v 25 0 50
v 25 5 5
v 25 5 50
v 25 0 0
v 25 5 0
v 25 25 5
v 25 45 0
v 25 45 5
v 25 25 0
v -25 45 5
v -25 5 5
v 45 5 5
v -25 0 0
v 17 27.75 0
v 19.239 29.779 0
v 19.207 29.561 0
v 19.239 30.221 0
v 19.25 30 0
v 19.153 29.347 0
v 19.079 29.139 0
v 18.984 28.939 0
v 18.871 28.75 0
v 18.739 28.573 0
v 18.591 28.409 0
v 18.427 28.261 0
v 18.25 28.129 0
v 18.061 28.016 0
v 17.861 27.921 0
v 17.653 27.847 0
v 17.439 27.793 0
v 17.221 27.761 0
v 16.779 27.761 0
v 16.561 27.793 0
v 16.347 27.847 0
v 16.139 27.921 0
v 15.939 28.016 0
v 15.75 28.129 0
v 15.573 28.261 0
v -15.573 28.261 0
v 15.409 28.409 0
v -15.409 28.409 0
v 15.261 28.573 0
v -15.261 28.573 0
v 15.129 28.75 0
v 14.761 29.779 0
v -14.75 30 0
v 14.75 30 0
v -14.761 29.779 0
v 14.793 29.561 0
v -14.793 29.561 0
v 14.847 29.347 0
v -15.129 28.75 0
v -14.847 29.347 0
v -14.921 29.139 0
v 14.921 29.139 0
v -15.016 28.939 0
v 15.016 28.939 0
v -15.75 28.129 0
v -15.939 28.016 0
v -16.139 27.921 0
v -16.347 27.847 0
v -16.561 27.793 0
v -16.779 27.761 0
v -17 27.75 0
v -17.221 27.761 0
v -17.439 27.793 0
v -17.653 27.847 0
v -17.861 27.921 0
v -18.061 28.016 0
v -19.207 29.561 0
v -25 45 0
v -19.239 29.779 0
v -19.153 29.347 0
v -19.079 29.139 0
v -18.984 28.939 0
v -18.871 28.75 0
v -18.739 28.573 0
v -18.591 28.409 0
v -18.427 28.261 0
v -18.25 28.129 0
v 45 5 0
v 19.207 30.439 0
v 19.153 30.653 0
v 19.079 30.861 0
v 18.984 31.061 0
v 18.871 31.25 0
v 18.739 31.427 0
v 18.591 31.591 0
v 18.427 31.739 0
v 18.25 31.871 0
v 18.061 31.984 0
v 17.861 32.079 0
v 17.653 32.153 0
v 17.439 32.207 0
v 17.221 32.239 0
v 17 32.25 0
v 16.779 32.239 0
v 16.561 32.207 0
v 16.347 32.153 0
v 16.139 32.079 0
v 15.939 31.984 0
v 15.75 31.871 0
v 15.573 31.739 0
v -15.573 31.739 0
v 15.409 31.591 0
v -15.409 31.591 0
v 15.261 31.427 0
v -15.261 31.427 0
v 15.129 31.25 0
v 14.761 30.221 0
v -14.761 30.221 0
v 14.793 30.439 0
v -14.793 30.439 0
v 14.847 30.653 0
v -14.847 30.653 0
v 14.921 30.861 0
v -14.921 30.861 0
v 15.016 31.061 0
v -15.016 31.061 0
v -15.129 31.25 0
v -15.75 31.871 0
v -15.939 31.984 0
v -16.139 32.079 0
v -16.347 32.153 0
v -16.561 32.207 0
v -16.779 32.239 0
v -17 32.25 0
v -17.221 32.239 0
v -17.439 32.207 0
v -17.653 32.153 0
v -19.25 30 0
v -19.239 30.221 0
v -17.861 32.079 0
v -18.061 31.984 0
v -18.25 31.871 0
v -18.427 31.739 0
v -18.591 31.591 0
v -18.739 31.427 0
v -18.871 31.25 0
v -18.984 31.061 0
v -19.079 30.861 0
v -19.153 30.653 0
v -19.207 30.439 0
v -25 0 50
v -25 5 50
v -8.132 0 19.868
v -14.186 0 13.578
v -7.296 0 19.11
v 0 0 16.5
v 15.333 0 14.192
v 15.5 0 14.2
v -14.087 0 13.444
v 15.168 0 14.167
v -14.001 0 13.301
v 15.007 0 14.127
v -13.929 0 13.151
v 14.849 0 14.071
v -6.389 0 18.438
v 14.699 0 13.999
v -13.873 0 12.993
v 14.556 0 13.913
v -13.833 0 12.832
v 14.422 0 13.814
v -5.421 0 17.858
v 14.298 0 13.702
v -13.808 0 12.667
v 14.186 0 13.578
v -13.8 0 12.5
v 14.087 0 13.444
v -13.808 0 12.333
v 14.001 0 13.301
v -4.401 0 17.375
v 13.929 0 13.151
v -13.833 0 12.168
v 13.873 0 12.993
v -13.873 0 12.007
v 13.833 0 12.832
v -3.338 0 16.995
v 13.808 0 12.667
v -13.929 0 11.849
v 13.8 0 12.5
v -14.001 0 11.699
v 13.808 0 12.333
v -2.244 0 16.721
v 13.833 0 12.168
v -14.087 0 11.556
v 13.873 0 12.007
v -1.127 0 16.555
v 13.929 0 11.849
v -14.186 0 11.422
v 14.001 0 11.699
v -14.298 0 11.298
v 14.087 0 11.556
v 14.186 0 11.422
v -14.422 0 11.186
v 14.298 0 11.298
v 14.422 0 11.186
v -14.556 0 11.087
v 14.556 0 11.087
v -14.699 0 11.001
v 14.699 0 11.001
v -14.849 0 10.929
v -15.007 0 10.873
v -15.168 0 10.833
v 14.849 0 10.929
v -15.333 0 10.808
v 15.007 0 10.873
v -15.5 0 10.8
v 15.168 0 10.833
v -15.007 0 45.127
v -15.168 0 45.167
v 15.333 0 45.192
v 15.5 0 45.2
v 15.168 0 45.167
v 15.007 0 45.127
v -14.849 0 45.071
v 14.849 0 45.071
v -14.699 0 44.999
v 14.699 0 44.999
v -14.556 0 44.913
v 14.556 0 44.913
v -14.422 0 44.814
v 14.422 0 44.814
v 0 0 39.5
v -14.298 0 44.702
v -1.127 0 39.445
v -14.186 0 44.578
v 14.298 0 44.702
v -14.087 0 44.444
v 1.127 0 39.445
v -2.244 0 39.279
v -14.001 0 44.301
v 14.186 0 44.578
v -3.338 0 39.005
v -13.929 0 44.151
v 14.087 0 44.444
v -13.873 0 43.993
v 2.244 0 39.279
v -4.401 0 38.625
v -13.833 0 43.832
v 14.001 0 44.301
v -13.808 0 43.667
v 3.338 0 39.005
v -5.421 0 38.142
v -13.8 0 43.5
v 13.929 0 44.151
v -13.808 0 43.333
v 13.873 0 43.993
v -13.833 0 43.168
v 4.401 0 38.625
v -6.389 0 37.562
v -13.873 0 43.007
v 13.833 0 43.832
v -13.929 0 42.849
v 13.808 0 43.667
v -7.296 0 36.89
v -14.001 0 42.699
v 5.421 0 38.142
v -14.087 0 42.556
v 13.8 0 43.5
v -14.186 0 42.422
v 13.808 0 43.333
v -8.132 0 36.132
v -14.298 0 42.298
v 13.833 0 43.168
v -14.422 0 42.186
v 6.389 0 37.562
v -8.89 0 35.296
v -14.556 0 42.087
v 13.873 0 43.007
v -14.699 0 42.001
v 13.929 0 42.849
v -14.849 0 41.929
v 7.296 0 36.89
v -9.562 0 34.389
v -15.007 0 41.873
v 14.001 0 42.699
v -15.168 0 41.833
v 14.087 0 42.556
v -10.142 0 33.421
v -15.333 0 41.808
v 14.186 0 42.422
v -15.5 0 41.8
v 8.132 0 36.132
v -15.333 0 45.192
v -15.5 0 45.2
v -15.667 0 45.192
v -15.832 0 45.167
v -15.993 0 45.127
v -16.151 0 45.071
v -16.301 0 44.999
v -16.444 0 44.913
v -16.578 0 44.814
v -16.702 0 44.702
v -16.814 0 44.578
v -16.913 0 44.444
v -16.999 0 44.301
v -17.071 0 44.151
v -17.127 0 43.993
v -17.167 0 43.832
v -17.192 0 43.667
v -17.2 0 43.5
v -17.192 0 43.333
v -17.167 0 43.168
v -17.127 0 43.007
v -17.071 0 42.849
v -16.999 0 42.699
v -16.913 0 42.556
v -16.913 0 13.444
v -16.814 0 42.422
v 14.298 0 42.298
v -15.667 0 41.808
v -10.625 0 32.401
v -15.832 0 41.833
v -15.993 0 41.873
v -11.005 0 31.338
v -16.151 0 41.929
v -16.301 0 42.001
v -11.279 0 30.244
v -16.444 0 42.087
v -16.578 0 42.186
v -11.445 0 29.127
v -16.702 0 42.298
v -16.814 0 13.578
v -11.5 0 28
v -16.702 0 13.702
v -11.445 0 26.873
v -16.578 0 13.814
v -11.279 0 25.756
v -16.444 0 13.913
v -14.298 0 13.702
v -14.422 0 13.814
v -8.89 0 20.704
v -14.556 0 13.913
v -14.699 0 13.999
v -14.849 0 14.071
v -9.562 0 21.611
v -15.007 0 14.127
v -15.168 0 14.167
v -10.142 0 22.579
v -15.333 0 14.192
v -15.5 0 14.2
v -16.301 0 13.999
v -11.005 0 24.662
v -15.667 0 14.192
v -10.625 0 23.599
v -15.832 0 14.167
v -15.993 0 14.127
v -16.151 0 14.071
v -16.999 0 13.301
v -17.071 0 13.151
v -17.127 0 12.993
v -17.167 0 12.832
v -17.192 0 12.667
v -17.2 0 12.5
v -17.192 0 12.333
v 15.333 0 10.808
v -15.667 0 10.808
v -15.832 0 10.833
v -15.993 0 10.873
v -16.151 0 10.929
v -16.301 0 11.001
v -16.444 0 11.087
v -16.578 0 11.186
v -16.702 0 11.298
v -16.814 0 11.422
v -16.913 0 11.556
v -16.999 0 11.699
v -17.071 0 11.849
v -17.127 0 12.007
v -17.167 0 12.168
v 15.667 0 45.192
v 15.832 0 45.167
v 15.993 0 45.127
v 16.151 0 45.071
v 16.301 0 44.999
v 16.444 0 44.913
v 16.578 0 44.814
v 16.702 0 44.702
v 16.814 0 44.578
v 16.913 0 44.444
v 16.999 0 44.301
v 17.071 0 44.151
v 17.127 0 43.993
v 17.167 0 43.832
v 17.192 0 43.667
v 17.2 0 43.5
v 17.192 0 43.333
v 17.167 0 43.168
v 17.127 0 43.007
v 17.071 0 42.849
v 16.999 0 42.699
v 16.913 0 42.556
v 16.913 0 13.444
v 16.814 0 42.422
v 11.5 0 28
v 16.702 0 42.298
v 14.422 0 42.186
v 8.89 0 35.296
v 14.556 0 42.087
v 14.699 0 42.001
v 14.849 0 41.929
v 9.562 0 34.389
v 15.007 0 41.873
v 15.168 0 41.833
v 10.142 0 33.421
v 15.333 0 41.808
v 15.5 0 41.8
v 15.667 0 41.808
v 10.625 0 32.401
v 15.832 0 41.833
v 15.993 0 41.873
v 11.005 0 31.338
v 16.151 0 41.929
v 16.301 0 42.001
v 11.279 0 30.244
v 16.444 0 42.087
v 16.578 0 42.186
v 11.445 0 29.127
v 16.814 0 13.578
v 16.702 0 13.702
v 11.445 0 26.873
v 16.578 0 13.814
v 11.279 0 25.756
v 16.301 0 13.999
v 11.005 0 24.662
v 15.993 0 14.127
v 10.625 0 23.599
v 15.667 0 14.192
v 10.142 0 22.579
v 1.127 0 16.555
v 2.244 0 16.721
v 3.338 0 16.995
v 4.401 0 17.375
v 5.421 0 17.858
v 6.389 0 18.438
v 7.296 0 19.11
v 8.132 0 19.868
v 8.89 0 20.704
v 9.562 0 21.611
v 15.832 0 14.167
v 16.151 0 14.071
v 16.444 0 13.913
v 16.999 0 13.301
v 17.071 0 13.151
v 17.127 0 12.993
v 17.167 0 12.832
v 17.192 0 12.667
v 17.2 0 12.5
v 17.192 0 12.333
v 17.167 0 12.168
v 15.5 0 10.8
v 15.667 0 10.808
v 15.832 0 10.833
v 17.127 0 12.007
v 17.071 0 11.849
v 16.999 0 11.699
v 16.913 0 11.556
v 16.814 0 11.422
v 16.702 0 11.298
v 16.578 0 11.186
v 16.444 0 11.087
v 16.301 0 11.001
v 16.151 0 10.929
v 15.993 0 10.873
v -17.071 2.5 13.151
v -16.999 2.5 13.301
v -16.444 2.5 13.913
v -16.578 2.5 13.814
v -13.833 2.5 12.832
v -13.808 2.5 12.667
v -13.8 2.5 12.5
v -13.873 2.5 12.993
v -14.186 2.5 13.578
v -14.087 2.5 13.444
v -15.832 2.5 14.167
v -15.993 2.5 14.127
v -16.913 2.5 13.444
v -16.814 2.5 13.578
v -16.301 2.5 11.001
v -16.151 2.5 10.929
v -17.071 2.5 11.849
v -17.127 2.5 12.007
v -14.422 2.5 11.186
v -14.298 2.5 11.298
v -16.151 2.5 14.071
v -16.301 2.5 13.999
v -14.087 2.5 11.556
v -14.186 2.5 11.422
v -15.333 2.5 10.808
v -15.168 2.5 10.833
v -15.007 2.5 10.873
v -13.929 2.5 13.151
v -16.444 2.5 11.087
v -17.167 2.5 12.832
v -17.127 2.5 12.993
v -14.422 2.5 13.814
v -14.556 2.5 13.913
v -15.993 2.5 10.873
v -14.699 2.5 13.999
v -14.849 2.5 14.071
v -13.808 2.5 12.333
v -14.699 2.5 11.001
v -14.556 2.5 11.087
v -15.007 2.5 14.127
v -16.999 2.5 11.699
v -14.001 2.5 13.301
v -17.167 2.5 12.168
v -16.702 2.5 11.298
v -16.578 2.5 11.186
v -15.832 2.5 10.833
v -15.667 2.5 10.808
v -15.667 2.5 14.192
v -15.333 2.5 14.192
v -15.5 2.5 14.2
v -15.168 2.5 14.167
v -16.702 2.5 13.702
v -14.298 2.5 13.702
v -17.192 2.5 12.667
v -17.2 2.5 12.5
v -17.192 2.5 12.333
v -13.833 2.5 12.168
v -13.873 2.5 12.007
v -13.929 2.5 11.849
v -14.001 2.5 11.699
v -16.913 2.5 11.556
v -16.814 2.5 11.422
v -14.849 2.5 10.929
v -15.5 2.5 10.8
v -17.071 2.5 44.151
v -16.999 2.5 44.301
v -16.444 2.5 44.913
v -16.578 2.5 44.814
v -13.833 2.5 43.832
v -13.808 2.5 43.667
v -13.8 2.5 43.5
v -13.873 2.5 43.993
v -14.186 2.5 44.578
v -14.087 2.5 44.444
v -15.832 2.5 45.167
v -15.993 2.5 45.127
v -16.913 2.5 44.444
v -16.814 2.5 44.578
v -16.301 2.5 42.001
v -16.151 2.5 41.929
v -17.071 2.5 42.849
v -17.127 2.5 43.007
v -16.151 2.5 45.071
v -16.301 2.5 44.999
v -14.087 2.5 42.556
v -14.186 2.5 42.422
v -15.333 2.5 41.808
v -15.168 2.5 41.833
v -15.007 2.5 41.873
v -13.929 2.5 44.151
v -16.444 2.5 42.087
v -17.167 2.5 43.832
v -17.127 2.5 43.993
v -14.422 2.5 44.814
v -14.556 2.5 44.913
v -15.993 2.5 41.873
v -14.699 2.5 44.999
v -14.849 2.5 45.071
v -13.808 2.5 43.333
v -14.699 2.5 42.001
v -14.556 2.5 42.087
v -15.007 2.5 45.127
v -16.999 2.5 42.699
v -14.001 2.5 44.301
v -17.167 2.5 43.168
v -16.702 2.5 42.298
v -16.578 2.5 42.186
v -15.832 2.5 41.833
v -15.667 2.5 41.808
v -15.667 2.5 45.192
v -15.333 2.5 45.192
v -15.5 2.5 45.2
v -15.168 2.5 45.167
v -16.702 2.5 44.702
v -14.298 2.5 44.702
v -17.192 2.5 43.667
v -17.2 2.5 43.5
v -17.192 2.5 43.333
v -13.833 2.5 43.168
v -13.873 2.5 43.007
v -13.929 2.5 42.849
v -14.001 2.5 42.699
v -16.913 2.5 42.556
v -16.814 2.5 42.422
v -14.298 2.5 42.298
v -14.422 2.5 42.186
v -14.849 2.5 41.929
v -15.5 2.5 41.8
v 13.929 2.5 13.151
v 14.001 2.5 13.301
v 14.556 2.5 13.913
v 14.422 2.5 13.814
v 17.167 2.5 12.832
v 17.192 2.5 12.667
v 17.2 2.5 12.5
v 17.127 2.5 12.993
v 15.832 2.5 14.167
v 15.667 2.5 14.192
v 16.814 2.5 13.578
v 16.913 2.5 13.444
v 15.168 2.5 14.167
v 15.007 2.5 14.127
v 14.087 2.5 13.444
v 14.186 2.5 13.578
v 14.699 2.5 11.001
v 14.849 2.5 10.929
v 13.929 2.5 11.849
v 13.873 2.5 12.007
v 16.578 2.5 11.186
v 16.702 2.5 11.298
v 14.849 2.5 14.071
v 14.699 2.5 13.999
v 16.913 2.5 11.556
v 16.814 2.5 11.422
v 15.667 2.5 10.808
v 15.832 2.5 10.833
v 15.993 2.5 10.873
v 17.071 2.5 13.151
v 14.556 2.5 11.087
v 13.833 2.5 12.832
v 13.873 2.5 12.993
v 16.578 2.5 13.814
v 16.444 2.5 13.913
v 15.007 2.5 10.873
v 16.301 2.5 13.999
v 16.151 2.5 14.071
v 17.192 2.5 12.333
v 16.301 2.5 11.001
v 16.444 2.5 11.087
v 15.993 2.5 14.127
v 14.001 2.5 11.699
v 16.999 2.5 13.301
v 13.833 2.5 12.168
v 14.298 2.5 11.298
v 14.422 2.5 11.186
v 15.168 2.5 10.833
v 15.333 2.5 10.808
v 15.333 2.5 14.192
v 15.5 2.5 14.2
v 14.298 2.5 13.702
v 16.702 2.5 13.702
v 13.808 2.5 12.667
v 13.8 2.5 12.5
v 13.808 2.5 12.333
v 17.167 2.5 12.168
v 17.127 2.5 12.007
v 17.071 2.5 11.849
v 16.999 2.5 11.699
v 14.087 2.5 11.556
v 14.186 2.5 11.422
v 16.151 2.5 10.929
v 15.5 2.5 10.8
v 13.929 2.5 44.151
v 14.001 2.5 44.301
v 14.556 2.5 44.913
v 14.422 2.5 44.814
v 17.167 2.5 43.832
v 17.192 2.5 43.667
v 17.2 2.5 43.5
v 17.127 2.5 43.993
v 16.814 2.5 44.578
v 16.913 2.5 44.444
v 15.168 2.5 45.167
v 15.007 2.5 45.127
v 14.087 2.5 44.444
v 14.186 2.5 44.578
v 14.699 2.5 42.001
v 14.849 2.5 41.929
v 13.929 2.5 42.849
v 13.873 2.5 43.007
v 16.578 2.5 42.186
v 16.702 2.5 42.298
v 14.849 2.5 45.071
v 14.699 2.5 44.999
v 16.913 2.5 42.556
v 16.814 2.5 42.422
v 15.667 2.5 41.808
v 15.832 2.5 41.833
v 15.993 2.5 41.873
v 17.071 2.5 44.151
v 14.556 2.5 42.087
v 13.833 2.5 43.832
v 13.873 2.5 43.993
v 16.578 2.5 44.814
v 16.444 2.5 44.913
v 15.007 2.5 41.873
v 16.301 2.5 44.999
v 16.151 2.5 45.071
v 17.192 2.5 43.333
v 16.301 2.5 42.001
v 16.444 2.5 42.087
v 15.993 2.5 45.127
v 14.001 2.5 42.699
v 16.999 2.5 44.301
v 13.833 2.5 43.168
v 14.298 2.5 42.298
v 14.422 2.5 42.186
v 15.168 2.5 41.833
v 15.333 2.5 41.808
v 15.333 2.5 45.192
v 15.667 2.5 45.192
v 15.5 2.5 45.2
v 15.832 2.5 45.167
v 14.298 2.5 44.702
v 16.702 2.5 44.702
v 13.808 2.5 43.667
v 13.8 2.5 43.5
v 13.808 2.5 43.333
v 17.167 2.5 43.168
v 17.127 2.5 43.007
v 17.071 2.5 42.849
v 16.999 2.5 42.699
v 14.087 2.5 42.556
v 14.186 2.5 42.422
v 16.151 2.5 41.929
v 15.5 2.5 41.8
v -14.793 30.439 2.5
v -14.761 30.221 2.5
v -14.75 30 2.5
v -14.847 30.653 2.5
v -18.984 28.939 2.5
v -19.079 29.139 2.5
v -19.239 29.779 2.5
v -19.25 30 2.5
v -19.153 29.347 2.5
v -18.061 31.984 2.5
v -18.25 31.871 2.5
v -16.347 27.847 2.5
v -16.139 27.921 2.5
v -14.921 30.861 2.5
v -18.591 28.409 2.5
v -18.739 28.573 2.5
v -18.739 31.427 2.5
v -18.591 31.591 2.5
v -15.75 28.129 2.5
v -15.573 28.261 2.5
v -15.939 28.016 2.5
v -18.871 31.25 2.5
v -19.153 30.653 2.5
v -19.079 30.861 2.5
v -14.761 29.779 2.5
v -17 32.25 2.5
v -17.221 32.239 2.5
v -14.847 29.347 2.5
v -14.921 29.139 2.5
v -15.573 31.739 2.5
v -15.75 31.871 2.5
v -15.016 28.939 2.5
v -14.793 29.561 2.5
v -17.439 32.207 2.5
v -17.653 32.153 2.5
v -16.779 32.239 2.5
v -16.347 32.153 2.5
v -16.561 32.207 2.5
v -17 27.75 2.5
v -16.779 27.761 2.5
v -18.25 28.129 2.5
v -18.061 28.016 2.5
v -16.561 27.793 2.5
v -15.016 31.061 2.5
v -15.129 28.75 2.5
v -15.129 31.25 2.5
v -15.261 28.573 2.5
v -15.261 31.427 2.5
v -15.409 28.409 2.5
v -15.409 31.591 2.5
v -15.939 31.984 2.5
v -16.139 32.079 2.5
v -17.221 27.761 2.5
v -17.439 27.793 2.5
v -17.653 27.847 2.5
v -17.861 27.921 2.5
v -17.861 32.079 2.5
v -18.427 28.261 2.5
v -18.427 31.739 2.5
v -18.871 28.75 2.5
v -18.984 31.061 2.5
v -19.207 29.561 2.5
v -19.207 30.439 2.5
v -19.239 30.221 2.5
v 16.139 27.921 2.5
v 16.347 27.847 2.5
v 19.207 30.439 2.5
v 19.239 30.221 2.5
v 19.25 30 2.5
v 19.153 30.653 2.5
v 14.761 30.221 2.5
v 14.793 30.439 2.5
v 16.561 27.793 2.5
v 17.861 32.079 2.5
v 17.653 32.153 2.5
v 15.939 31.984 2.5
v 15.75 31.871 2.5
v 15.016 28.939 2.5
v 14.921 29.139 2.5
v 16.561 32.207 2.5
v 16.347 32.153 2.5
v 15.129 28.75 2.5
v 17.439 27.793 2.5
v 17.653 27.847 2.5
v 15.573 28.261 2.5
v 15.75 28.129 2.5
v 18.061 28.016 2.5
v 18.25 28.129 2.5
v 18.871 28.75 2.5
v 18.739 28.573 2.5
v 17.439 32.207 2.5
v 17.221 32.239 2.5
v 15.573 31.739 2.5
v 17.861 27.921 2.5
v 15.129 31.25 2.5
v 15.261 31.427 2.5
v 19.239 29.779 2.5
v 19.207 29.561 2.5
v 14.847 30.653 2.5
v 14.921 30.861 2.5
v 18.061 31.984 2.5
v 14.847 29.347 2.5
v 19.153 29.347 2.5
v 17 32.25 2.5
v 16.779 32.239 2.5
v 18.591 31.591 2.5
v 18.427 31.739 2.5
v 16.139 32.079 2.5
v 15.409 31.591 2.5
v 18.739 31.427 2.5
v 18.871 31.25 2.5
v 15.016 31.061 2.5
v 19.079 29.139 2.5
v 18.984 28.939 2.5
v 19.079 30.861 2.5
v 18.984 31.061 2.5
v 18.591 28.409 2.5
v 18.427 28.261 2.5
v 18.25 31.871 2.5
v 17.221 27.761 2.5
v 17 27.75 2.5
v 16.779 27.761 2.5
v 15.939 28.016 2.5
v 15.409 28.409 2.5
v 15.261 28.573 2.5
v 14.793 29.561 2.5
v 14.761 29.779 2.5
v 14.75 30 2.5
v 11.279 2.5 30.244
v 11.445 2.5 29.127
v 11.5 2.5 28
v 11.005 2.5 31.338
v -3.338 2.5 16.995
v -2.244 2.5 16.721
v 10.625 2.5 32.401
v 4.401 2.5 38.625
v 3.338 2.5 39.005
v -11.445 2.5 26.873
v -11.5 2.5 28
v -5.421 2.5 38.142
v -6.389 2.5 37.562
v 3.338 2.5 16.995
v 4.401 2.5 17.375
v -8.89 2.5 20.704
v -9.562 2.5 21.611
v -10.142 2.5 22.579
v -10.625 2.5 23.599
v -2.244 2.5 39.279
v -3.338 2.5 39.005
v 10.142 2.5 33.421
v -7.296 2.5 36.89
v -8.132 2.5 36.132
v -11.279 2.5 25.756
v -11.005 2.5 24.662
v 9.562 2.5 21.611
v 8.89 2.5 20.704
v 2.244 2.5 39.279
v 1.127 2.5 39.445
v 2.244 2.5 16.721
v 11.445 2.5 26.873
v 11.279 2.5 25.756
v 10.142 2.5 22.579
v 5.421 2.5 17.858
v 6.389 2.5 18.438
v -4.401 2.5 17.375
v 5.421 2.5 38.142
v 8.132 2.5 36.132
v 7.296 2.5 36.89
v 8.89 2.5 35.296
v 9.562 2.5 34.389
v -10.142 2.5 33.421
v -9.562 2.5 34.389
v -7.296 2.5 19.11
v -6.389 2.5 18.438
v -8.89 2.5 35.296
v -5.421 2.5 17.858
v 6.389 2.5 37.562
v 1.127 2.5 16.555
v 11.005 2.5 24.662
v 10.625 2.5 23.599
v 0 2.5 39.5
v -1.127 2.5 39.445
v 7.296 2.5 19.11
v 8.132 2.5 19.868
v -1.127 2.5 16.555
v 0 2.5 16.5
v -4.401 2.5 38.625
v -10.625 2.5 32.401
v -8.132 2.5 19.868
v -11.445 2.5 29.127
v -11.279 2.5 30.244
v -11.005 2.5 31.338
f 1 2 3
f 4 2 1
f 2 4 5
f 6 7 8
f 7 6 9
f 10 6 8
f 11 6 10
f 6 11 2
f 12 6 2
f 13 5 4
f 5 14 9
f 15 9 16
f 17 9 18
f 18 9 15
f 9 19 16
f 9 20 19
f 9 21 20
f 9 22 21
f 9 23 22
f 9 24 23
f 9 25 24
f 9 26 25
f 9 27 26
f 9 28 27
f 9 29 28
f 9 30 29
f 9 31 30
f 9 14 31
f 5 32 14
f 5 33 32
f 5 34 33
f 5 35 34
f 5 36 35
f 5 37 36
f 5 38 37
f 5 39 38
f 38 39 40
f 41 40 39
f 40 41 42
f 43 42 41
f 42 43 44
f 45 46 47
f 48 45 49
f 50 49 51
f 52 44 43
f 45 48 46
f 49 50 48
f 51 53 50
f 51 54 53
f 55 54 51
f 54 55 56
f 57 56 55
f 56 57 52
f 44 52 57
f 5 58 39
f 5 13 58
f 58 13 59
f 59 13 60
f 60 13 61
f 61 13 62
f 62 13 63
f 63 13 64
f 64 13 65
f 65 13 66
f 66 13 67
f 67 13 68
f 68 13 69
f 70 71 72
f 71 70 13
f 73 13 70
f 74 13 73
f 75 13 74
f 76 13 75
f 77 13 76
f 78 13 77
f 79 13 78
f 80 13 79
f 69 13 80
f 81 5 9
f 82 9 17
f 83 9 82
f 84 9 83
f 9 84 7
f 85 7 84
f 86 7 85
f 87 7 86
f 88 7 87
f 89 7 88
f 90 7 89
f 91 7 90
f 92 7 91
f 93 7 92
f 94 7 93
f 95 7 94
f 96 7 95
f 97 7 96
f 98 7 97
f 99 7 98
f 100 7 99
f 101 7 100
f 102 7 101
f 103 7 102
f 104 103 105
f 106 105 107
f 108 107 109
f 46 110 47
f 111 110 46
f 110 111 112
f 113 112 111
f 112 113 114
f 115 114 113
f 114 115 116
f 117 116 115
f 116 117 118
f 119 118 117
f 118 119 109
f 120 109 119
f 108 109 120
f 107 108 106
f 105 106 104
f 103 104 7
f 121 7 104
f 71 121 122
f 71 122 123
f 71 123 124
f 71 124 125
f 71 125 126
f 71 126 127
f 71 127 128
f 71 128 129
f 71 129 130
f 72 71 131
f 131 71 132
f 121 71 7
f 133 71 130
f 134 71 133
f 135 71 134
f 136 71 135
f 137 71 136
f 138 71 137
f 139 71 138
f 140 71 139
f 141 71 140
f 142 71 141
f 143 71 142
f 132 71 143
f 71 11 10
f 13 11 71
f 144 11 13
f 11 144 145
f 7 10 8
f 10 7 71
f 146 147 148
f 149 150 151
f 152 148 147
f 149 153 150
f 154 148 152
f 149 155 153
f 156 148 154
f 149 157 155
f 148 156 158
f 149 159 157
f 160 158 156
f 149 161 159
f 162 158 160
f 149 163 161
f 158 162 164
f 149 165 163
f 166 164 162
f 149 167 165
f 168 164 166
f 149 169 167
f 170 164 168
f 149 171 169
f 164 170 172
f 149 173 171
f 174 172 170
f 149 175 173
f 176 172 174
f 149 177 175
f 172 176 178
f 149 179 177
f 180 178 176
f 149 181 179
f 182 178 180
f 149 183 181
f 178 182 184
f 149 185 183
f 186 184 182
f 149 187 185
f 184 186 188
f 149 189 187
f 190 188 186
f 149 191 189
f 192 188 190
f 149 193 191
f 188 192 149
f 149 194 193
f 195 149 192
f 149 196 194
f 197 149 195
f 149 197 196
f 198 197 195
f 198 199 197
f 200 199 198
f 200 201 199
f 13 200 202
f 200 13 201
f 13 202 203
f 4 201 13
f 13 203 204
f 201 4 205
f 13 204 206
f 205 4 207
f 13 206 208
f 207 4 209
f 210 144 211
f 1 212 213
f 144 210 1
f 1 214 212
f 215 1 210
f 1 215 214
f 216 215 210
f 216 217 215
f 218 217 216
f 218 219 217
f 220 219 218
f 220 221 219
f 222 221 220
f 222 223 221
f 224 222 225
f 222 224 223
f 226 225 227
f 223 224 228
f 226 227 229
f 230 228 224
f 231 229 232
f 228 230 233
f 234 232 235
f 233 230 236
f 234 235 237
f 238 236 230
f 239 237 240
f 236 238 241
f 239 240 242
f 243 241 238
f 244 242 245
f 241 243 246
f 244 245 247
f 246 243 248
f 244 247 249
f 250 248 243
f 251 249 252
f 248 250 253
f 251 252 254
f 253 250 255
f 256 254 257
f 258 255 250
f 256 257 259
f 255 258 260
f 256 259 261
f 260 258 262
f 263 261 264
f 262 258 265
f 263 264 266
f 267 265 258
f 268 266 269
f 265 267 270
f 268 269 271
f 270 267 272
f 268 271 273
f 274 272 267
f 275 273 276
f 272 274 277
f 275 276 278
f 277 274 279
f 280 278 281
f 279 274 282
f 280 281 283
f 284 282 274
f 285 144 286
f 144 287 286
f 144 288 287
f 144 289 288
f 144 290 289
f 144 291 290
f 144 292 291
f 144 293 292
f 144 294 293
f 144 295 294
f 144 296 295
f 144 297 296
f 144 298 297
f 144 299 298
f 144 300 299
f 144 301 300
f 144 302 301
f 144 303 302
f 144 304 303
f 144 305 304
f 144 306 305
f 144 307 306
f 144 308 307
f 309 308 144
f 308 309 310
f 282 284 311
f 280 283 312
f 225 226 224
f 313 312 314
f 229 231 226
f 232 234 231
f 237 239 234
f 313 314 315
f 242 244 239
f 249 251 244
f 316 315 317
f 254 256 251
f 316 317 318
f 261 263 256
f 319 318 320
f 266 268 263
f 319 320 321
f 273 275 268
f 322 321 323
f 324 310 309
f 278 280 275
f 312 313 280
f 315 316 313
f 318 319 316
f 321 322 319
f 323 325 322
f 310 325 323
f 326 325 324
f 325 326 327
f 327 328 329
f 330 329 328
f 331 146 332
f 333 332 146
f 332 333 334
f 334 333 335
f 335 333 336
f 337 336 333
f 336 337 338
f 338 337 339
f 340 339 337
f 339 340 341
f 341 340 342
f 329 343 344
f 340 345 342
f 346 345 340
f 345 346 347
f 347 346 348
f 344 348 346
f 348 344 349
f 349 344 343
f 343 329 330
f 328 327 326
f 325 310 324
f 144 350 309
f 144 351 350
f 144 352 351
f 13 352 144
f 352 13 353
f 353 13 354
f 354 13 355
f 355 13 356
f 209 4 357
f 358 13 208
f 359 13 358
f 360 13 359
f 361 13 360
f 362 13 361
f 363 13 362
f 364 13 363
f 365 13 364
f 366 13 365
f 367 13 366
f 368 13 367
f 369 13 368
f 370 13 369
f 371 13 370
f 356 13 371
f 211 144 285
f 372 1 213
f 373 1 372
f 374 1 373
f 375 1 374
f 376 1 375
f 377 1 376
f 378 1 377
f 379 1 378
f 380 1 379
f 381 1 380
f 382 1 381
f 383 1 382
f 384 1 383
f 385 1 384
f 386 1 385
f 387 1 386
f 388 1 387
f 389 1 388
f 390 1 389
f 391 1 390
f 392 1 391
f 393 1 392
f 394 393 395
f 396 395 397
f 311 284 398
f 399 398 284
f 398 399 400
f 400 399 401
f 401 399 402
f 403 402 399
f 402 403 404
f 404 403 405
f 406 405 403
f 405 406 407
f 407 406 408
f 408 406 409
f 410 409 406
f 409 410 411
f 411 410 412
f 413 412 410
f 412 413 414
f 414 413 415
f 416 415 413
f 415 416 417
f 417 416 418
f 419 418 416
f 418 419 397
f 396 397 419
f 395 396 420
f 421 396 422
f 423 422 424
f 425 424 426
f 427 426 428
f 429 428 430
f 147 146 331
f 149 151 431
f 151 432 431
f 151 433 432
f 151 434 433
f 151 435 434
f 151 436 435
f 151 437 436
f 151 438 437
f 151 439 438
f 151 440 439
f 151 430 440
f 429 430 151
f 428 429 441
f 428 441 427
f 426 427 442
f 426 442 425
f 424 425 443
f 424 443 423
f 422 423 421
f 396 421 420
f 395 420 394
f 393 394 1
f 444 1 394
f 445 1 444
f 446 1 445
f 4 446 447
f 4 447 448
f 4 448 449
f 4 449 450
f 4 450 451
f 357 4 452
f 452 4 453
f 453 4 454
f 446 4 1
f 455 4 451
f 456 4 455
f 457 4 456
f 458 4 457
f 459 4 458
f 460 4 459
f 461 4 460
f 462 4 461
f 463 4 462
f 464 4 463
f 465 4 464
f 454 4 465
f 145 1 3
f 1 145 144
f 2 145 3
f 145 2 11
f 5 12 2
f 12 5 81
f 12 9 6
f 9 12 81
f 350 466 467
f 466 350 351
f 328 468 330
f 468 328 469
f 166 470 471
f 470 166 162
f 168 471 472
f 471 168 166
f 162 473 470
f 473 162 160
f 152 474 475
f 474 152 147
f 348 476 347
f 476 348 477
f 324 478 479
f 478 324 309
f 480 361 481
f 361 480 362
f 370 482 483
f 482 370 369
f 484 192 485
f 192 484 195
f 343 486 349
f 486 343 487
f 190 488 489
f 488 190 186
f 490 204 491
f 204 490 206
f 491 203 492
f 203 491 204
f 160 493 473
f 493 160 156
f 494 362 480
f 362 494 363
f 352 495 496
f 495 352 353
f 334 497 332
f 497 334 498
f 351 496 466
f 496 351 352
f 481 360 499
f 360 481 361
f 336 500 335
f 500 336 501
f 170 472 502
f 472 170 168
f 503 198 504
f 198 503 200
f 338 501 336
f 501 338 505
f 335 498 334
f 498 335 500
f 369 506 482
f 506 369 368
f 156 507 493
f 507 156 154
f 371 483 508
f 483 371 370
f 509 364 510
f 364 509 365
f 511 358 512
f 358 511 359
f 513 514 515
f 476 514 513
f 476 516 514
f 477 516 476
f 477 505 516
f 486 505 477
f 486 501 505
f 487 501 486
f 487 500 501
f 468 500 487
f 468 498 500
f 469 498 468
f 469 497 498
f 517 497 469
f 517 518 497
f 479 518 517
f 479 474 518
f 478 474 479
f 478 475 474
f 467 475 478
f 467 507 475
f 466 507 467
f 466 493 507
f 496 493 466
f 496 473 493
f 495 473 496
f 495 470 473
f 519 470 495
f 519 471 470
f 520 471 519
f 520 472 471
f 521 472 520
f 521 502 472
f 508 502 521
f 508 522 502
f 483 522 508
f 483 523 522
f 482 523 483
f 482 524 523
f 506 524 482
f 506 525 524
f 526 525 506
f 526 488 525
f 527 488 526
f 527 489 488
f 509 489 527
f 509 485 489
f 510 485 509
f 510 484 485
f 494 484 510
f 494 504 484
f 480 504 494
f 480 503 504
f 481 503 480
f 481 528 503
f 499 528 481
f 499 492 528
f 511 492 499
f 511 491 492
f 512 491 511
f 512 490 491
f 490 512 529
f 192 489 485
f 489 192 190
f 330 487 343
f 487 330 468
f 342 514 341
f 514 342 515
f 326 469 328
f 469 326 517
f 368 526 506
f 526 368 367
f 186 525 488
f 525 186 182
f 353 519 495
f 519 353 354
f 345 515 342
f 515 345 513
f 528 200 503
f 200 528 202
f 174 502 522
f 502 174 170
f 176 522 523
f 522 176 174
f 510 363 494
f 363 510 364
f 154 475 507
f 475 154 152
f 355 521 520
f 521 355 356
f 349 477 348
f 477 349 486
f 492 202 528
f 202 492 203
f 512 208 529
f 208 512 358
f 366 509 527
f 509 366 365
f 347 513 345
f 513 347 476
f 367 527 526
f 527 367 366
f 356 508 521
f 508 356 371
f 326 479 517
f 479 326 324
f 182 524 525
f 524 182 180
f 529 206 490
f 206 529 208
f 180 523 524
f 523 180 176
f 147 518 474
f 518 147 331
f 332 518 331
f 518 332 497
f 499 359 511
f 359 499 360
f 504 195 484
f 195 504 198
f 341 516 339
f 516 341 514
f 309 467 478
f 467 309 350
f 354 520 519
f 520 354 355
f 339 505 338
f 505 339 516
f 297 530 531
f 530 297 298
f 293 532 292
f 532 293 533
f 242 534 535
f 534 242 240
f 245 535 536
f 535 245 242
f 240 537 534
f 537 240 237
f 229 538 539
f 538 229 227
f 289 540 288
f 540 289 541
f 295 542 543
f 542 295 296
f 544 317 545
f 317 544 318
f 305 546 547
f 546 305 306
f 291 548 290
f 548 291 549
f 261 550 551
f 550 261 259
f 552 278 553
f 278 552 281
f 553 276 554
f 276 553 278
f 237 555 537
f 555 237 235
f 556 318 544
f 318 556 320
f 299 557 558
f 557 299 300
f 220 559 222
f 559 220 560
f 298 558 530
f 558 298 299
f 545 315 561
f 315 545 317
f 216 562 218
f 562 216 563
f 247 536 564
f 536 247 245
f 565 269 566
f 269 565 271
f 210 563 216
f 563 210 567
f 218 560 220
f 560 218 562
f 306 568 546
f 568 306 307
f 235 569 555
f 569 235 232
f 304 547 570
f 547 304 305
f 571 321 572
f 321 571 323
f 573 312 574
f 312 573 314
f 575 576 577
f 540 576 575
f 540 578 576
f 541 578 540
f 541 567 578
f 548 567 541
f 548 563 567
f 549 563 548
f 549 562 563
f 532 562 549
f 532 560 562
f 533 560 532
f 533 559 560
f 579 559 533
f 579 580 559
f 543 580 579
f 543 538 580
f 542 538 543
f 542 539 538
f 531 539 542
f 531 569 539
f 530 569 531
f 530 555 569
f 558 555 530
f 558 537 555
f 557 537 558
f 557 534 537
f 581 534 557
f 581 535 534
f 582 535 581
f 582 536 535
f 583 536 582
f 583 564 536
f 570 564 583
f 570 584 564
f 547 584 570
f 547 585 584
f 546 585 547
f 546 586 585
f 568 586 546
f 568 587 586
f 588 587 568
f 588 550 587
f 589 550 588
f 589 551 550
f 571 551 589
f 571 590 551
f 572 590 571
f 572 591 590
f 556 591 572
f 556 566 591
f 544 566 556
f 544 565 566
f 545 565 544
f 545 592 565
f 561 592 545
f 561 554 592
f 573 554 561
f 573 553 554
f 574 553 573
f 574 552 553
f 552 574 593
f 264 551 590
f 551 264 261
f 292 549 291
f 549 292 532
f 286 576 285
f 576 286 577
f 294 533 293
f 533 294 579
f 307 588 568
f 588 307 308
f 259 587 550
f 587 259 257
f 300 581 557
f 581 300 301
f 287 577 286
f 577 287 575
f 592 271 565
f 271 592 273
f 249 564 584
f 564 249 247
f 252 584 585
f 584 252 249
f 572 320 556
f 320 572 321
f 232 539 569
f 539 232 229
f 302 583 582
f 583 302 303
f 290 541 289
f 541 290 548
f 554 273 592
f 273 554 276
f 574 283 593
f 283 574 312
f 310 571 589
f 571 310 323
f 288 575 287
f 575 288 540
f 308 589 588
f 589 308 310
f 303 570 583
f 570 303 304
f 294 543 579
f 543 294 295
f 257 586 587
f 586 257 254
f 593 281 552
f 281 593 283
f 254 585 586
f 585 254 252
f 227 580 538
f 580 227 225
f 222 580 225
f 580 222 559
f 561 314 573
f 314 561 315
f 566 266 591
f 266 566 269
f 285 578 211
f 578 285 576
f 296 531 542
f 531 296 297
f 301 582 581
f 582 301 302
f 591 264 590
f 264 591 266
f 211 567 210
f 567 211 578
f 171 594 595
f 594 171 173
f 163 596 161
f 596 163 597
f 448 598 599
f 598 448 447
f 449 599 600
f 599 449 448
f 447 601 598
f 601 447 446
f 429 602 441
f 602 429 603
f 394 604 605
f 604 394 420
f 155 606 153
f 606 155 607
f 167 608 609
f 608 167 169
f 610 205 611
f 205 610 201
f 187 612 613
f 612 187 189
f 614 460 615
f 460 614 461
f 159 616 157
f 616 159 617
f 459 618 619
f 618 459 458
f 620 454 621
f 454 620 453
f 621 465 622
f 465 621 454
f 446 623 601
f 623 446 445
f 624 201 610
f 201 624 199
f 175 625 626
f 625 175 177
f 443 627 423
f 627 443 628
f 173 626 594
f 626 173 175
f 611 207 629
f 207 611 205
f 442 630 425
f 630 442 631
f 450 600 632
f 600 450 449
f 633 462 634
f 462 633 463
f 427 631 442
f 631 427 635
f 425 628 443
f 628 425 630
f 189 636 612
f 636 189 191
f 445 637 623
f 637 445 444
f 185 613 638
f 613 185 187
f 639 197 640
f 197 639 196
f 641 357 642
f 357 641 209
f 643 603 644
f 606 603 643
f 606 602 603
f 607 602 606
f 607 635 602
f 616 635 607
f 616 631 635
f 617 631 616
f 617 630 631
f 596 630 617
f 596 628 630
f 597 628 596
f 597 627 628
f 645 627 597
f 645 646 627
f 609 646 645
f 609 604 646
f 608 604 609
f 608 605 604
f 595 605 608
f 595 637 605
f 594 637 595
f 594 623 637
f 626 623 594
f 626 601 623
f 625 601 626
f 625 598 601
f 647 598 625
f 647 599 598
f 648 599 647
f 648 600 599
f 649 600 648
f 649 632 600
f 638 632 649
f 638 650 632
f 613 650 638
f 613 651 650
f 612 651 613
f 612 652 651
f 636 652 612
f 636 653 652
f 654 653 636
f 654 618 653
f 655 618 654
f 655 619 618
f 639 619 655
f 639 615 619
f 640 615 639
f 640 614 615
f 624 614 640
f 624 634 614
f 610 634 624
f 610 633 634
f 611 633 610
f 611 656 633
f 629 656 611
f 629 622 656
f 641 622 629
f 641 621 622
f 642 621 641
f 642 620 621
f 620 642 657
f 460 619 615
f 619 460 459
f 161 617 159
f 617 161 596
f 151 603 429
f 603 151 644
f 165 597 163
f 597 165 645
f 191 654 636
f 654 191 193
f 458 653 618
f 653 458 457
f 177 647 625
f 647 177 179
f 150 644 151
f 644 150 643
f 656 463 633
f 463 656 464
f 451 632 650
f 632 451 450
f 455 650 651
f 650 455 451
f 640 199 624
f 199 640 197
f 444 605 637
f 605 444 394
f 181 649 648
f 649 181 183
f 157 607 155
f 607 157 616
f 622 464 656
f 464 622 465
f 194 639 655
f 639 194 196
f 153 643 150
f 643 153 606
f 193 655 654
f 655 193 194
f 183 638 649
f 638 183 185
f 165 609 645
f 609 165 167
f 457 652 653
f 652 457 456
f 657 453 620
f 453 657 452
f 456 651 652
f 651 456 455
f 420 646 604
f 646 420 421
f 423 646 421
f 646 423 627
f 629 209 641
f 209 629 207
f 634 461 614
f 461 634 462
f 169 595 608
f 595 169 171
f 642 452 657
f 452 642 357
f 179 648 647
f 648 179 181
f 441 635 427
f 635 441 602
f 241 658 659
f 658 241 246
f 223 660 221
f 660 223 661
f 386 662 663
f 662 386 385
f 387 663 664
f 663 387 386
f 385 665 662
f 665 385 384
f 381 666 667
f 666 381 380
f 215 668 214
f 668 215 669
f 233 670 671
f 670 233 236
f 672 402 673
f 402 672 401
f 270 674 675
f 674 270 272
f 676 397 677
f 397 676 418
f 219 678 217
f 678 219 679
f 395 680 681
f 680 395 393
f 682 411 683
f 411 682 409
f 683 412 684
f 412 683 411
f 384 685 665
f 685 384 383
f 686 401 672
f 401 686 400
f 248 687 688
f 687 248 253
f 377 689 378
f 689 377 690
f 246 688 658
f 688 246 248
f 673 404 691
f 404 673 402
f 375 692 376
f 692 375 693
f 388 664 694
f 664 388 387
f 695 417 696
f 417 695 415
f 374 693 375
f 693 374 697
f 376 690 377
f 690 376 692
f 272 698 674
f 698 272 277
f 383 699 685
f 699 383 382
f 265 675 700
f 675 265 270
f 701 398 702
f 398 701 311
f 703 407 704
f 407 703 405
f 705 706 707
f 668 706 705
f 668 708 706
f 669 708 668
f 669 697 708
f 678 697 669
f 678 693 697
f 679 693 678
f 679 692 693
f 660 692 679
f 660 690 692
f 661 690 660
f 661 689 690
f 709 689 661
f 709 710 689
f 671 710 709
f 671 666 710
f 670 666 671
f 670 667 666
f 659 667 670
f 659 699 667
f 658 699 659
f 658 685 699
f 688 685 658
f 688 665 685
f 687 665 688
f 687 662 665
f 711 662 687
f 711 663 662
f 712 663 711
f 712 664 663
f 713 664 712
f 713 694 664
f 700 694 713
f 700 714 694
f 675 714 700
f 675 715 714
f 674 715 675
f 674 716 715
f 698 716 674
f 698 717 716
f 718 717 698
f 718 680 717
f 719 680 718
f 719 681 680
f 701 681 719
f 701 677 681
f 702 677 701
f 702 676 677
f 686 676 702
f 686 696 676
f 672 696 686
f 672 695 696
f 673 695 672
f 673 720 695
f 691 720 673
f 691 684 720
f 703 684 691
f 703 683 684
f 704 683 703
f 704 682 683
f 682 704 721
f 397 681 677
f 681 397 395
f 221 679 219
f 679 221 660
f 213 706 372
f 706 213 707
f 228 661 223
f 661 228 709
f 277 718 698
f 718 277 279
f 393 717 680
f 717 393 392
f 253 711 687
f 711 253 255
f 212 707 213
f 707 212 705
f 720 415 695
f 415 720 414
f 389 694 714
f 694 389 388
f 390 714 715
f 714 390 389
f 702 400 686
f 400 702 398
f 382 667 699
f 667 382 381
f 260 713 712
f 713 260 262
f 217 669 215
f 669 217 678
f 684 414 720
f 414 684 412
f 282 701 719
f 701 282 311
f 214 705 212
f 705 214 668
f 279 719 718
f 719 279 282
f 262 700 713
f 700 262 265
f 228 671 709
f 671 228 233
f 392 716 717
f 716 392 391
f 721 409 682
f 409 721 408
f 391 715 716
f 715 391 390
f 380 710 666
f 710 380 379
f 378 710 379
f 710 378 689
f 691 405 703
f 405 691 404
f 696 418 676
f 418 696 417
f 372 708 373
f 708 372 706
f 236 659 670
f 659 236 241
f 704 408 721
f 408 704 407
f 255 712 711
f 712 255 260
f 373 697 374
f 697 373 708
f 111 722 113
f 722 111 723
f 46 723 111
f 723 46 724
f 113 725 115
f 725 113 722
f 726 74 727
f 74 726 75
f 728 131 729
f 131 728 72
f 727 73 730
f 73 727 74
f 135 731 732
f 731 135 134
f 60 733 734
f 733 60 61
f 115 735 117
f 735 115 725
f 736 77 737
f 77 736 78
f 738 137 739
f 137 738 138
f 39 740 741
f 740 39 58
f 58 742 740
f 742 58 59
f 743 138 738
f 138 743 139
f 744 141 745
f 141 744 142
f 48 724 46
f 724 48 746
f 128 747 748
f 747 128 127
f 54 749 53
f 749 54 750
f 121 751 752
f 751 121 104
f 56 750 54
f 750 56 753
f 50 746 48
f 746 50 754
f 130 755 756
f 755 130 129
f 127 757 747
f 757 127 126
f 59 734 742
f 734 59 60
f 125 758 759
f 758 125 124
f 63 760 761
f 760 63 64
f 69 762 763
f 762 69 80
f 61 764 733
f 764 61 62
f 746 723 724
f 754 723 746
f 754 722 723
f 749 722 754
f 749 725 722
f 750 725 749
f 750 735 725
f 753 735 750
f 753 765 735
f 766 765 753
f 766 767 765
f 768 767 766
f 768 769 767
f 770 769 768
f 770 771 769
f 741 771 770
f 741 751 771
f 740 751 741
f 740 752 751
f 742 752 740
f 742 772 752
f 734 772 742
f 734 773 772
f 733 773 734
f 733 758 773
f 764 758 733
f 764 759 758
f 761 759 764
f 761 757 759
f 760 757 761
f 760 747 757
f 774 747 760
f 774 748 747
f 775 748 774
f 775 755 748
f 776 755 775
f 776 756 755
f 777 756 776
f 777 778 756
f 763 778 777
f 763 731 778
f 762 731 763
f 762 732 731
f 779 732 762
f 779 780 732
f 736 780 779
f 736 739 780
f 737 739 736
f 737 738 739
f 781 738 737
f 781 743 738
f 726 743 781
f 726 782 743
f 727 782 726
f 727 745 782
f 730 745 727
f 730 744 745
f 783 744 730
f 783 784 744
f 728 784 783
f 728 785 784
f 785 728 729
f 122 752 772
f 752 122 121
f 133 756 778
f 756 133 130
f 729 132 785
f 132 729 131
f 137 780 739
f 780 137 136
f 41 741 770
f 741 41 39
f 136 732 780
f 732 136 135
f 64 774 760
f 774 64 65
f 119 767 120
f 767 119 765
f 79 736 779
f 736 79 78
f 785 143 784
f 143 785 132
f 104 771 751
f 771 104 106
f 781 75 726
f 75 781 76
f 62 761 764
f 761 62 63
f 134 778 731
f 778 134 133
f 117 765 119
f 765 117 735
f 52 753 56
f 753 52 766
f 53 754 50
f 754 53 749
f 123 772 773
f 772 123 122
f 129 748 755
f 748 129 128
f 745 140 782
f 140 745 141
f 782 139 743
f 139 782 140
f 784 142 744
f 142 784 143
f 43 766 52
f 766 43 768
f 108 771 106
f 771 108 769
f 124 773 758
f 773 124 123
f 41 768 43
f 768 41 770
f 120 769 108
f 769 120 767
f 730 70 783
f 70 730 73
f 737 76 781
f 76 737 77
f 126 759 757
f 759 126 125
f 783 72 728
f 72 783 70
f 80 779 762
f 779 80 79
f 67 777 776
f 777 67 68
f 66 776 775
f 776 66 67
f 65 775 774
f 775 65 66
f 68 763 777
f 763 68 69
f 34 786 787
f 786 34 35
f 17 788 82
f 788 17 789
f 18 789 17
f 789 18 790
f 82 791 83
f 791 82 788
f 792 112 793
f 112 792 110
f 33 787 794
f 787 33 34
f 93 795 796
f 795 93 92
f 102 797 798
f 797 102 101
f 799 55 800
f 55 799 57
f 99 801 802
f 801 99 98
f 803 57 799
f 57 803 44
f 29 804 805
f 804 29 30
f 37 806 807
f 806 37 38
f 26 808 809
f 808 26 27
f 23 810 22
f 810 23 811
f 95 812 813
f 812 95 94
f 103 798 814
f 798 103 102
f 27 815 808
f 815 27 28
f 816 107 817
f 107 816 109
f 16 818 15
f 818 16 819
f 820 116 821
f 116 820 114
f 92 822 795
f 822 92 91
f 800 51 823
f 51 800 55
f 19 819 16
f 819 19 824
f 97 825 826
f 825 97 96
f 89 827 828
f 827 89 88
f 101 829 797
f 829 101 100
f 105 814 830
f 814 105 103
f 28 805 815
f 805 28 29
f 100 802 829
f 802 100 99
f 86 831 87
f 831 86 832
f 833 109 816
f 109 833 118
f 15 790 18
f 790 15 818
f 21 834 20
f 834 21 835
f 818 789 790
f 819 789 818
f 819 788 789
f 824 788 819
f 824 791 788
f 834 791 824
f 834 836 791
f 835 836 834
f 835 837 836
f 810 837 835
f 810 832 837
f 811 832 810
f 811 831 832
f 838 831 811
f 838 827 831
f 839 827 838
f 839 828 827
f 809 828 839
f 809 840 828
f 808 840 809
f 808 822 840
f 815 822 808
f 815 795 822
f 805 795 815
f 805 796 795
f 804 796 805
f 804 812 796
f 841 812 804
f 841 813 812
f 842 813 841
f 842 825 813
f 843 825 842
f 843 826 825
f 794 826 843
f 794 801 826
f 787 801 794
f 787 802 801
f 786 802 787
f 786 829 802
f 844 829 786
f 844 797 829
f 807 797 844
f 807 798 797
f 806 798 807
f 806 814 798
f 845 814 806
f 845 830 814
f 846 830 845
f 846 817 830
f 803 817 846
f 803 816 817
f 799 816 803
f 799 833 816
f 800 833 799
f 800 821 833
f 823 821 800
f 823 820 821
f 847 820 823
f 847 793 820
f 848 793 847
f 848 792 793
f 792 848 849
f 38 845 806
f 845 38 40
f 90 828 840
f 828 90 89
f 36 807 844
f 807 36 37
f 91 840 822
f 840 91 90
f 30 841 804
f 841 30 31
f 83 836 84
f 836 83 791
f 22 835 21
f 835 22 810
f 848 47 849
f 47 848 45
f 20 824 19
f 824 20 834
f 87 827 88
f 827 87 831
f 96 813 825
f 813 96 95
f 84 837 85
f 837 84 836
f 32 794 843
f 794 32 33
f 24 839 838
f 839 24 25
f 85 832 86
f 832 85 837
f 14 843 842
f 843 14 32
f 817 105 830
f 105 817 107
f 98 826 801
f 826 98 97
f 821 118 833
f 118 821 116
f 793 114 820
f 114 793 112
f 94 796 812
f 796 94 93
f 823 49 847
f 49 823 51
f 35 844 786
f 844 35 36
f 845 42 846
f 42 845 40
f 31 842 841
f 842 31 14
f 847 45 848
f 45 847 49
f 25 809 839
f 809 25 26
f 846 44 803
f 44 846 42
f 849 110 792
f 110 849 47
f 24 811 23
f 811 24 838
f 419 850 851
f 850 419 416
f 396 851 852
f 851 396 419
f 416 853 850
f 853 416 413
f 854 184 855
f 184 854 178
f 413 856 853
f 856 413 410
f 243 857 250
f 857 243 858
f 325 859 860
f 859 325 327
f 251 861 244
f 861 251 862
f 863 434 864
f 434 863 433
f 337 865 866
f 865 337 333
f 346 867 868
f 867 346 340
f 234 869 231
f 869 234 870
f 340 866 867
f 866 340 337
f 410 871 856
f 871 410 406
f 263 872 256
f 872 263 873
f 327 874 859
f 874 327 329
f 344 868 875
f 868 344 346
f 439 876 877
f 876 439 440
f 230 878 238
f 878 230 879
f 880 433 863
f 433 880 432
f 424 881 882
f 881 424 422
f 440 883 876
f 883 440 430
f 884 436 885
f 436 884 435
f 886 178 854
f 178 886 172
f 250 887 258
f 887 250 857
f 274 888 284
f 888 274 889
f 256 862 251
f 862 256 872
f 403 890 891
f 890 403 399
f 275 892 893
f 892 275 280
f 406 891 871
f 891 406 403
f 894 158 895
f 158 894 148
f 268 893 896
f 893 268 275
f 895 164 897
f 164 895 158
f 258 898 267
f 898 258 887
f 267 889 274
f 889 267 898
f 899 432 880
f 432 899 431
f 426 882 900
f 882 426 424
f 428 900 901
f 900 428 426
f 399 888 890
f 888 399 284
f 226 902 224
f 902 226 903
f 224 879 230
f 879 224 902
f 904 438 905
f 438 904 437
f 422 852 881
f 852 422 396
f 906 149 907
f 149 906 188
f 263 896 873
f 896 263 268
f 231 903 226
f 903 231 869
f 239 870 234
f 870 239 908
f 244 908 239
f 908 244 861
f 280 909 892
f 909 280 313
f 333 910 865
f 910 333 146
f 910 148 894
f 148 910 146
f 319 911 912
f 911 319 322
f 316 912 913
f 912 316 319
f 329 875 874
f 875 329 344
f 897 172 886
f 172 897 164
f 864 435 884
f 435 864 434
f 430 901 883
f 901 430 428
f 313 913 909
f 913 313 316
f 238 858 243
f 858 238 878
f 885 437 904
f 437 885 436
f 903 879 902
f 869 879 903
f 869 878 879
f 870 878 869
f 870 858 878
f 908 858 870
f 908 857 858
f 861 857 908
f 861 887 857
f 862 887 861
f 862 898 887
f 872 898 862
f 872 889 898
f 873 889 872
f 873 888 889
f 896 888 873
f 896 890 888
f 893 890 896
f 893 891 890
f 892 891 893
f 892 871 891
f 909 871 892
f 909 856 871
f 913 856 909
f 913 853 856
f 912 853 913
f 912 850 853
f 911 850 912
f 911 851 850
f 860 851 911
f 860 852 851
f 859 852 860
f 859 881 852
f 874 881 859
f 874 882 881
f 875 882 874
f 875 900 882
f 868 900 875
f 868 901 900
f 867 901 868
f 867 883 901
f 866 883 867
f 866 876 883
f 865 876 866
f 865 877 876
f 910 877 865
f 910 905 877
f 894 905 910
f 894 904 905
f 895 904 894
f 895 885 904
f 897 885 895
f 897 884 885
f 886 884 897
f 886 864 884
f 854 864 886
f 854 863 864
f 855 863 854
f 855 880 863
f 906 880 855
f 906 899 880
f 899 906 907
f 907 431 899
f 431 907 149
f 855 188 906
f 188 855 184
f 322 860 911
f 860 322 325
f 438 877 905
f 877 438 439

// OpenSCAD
// L-shaped NEMA 17 Mounting Bracket for Syringe Pump
// Print orientation: Base on bed (XY plane), building up +Z.

// --- Dimensions ---
// Base Plate
base_x = 50;          // Total width (x from -25 to 25)
base_y = 45;          // Total depth (y from 0 to 45)
base_z = 5;           // Thickness

// Vertical Motor Plate
motor_plate_x = 50;   // Total width (x from -25 to 25)
motor_plate_y = 5;    // Thickness (y from 0 to 5)
motor_plate_z = 50;   // Height (z from 0 to 50)

// Base Holes (M4)
base_hole_dia = 4.5;
base_hole_offset_x = 17;
base_hole_offset_y = 30;

// Motor Plate Holes
boss_hole_dia = 23;
boss_hole_z = 28;     // Center height of boss hole

m3_hole_dia = 3.4;
m3_pattern_size = 31; // Square pattern size
m3_pattern_z = 28;    // Center height of M3 pattern

// Gussets
gusset_thickness = 5;
gusset_leg = 20;      // Length of triangle legs
gusset_x_start = 20;  // Gussets are at x=20..25 and x=-25..-20

// --- Rendering Settings ---
$fn = 64;

// --- Main Structure ---
difference() {
    union() {
        // 1. Base Plate
        // Centered at x=0, y=base_y/2, z=base_z/2
        translate([-base_x/2, 0, 0])
            cube([base_x, base_y, base_z]);

        // 2. Vertical Motor Plate
        // Stands on the back edge of the base (y=0 to y=5)
        // Centered at x=0, y=motor_plate_y/2, z=motor_plate_z/2
        translate([-motor_plate_x/2, 0, 0])
            cube([motor_plate_x, motor_plate_y, motor_plate_z]);

        // 3. Left Gusset
        // Right triangle in YZ plane, right angle at (y=5, z=5)
        // Legs go +Y (to 25) and +Z (to 25)
        // Located at x = -25 to -20
        translate([-25, 0, 0])
            linear_extrude(height = 5, convexity = 10)
            polygon(points = [[5,5], [25,5], [5,25]], paths = [[0,1,2]]);

        // 4. Right Gusset
        // Located at x = 20 to 25
        translate([20, 0, 0])
            linear_extrude(height = 5, convexity = 10)
            polygon(points = [[5,5], [25,5], [5,25]], paths = [[0,1,2]]);
    }

    // --- Cuts ---

    // 1. Base Plate Holes (M4)
    // Hole 1: x = -17, y = 30
    translate([-17, 30, -0.1])
        cylinder(h = base_z + 0.2, r = base_hole_dia/2, center = true);

    // Hole 2: x = 17, y = 30
    translate([17, 30, -0.1])
        cylinder(h = base_z + 0.2, r = base_hole_dia/2, center = true);

    // 2. Motor Plate Boss Hole (23mm)
    // Center at x=0, z=28. Cuts through Y (thickness 5).
    // Cylinder axis along Y.
    translate([0, -0.1, boss_hole_z])
        rotate([90, 0, 0])
        cylinder(h = motor_plate_y + 0.2, r = boss_hole_dia/2, center = true);

    // 3. Motor Plate M3 Holes (31mm square pattern)
    // Center at x=0, z=28.
    // Pattern corners: x = +/- 15.5, z = 28 +/- 15.5
    for (dx = [-15.5, 15.5]) {
        for (dz = [-15.5, 15.5]) {
            translate([dx, -0.1, m3_pattern_z + dz])
                rotate([90, 0, 0])
                cylinder(h = motor_plate_y + 0.2, r = m3_hole_dia/2, center = true);
        }
    }
}
